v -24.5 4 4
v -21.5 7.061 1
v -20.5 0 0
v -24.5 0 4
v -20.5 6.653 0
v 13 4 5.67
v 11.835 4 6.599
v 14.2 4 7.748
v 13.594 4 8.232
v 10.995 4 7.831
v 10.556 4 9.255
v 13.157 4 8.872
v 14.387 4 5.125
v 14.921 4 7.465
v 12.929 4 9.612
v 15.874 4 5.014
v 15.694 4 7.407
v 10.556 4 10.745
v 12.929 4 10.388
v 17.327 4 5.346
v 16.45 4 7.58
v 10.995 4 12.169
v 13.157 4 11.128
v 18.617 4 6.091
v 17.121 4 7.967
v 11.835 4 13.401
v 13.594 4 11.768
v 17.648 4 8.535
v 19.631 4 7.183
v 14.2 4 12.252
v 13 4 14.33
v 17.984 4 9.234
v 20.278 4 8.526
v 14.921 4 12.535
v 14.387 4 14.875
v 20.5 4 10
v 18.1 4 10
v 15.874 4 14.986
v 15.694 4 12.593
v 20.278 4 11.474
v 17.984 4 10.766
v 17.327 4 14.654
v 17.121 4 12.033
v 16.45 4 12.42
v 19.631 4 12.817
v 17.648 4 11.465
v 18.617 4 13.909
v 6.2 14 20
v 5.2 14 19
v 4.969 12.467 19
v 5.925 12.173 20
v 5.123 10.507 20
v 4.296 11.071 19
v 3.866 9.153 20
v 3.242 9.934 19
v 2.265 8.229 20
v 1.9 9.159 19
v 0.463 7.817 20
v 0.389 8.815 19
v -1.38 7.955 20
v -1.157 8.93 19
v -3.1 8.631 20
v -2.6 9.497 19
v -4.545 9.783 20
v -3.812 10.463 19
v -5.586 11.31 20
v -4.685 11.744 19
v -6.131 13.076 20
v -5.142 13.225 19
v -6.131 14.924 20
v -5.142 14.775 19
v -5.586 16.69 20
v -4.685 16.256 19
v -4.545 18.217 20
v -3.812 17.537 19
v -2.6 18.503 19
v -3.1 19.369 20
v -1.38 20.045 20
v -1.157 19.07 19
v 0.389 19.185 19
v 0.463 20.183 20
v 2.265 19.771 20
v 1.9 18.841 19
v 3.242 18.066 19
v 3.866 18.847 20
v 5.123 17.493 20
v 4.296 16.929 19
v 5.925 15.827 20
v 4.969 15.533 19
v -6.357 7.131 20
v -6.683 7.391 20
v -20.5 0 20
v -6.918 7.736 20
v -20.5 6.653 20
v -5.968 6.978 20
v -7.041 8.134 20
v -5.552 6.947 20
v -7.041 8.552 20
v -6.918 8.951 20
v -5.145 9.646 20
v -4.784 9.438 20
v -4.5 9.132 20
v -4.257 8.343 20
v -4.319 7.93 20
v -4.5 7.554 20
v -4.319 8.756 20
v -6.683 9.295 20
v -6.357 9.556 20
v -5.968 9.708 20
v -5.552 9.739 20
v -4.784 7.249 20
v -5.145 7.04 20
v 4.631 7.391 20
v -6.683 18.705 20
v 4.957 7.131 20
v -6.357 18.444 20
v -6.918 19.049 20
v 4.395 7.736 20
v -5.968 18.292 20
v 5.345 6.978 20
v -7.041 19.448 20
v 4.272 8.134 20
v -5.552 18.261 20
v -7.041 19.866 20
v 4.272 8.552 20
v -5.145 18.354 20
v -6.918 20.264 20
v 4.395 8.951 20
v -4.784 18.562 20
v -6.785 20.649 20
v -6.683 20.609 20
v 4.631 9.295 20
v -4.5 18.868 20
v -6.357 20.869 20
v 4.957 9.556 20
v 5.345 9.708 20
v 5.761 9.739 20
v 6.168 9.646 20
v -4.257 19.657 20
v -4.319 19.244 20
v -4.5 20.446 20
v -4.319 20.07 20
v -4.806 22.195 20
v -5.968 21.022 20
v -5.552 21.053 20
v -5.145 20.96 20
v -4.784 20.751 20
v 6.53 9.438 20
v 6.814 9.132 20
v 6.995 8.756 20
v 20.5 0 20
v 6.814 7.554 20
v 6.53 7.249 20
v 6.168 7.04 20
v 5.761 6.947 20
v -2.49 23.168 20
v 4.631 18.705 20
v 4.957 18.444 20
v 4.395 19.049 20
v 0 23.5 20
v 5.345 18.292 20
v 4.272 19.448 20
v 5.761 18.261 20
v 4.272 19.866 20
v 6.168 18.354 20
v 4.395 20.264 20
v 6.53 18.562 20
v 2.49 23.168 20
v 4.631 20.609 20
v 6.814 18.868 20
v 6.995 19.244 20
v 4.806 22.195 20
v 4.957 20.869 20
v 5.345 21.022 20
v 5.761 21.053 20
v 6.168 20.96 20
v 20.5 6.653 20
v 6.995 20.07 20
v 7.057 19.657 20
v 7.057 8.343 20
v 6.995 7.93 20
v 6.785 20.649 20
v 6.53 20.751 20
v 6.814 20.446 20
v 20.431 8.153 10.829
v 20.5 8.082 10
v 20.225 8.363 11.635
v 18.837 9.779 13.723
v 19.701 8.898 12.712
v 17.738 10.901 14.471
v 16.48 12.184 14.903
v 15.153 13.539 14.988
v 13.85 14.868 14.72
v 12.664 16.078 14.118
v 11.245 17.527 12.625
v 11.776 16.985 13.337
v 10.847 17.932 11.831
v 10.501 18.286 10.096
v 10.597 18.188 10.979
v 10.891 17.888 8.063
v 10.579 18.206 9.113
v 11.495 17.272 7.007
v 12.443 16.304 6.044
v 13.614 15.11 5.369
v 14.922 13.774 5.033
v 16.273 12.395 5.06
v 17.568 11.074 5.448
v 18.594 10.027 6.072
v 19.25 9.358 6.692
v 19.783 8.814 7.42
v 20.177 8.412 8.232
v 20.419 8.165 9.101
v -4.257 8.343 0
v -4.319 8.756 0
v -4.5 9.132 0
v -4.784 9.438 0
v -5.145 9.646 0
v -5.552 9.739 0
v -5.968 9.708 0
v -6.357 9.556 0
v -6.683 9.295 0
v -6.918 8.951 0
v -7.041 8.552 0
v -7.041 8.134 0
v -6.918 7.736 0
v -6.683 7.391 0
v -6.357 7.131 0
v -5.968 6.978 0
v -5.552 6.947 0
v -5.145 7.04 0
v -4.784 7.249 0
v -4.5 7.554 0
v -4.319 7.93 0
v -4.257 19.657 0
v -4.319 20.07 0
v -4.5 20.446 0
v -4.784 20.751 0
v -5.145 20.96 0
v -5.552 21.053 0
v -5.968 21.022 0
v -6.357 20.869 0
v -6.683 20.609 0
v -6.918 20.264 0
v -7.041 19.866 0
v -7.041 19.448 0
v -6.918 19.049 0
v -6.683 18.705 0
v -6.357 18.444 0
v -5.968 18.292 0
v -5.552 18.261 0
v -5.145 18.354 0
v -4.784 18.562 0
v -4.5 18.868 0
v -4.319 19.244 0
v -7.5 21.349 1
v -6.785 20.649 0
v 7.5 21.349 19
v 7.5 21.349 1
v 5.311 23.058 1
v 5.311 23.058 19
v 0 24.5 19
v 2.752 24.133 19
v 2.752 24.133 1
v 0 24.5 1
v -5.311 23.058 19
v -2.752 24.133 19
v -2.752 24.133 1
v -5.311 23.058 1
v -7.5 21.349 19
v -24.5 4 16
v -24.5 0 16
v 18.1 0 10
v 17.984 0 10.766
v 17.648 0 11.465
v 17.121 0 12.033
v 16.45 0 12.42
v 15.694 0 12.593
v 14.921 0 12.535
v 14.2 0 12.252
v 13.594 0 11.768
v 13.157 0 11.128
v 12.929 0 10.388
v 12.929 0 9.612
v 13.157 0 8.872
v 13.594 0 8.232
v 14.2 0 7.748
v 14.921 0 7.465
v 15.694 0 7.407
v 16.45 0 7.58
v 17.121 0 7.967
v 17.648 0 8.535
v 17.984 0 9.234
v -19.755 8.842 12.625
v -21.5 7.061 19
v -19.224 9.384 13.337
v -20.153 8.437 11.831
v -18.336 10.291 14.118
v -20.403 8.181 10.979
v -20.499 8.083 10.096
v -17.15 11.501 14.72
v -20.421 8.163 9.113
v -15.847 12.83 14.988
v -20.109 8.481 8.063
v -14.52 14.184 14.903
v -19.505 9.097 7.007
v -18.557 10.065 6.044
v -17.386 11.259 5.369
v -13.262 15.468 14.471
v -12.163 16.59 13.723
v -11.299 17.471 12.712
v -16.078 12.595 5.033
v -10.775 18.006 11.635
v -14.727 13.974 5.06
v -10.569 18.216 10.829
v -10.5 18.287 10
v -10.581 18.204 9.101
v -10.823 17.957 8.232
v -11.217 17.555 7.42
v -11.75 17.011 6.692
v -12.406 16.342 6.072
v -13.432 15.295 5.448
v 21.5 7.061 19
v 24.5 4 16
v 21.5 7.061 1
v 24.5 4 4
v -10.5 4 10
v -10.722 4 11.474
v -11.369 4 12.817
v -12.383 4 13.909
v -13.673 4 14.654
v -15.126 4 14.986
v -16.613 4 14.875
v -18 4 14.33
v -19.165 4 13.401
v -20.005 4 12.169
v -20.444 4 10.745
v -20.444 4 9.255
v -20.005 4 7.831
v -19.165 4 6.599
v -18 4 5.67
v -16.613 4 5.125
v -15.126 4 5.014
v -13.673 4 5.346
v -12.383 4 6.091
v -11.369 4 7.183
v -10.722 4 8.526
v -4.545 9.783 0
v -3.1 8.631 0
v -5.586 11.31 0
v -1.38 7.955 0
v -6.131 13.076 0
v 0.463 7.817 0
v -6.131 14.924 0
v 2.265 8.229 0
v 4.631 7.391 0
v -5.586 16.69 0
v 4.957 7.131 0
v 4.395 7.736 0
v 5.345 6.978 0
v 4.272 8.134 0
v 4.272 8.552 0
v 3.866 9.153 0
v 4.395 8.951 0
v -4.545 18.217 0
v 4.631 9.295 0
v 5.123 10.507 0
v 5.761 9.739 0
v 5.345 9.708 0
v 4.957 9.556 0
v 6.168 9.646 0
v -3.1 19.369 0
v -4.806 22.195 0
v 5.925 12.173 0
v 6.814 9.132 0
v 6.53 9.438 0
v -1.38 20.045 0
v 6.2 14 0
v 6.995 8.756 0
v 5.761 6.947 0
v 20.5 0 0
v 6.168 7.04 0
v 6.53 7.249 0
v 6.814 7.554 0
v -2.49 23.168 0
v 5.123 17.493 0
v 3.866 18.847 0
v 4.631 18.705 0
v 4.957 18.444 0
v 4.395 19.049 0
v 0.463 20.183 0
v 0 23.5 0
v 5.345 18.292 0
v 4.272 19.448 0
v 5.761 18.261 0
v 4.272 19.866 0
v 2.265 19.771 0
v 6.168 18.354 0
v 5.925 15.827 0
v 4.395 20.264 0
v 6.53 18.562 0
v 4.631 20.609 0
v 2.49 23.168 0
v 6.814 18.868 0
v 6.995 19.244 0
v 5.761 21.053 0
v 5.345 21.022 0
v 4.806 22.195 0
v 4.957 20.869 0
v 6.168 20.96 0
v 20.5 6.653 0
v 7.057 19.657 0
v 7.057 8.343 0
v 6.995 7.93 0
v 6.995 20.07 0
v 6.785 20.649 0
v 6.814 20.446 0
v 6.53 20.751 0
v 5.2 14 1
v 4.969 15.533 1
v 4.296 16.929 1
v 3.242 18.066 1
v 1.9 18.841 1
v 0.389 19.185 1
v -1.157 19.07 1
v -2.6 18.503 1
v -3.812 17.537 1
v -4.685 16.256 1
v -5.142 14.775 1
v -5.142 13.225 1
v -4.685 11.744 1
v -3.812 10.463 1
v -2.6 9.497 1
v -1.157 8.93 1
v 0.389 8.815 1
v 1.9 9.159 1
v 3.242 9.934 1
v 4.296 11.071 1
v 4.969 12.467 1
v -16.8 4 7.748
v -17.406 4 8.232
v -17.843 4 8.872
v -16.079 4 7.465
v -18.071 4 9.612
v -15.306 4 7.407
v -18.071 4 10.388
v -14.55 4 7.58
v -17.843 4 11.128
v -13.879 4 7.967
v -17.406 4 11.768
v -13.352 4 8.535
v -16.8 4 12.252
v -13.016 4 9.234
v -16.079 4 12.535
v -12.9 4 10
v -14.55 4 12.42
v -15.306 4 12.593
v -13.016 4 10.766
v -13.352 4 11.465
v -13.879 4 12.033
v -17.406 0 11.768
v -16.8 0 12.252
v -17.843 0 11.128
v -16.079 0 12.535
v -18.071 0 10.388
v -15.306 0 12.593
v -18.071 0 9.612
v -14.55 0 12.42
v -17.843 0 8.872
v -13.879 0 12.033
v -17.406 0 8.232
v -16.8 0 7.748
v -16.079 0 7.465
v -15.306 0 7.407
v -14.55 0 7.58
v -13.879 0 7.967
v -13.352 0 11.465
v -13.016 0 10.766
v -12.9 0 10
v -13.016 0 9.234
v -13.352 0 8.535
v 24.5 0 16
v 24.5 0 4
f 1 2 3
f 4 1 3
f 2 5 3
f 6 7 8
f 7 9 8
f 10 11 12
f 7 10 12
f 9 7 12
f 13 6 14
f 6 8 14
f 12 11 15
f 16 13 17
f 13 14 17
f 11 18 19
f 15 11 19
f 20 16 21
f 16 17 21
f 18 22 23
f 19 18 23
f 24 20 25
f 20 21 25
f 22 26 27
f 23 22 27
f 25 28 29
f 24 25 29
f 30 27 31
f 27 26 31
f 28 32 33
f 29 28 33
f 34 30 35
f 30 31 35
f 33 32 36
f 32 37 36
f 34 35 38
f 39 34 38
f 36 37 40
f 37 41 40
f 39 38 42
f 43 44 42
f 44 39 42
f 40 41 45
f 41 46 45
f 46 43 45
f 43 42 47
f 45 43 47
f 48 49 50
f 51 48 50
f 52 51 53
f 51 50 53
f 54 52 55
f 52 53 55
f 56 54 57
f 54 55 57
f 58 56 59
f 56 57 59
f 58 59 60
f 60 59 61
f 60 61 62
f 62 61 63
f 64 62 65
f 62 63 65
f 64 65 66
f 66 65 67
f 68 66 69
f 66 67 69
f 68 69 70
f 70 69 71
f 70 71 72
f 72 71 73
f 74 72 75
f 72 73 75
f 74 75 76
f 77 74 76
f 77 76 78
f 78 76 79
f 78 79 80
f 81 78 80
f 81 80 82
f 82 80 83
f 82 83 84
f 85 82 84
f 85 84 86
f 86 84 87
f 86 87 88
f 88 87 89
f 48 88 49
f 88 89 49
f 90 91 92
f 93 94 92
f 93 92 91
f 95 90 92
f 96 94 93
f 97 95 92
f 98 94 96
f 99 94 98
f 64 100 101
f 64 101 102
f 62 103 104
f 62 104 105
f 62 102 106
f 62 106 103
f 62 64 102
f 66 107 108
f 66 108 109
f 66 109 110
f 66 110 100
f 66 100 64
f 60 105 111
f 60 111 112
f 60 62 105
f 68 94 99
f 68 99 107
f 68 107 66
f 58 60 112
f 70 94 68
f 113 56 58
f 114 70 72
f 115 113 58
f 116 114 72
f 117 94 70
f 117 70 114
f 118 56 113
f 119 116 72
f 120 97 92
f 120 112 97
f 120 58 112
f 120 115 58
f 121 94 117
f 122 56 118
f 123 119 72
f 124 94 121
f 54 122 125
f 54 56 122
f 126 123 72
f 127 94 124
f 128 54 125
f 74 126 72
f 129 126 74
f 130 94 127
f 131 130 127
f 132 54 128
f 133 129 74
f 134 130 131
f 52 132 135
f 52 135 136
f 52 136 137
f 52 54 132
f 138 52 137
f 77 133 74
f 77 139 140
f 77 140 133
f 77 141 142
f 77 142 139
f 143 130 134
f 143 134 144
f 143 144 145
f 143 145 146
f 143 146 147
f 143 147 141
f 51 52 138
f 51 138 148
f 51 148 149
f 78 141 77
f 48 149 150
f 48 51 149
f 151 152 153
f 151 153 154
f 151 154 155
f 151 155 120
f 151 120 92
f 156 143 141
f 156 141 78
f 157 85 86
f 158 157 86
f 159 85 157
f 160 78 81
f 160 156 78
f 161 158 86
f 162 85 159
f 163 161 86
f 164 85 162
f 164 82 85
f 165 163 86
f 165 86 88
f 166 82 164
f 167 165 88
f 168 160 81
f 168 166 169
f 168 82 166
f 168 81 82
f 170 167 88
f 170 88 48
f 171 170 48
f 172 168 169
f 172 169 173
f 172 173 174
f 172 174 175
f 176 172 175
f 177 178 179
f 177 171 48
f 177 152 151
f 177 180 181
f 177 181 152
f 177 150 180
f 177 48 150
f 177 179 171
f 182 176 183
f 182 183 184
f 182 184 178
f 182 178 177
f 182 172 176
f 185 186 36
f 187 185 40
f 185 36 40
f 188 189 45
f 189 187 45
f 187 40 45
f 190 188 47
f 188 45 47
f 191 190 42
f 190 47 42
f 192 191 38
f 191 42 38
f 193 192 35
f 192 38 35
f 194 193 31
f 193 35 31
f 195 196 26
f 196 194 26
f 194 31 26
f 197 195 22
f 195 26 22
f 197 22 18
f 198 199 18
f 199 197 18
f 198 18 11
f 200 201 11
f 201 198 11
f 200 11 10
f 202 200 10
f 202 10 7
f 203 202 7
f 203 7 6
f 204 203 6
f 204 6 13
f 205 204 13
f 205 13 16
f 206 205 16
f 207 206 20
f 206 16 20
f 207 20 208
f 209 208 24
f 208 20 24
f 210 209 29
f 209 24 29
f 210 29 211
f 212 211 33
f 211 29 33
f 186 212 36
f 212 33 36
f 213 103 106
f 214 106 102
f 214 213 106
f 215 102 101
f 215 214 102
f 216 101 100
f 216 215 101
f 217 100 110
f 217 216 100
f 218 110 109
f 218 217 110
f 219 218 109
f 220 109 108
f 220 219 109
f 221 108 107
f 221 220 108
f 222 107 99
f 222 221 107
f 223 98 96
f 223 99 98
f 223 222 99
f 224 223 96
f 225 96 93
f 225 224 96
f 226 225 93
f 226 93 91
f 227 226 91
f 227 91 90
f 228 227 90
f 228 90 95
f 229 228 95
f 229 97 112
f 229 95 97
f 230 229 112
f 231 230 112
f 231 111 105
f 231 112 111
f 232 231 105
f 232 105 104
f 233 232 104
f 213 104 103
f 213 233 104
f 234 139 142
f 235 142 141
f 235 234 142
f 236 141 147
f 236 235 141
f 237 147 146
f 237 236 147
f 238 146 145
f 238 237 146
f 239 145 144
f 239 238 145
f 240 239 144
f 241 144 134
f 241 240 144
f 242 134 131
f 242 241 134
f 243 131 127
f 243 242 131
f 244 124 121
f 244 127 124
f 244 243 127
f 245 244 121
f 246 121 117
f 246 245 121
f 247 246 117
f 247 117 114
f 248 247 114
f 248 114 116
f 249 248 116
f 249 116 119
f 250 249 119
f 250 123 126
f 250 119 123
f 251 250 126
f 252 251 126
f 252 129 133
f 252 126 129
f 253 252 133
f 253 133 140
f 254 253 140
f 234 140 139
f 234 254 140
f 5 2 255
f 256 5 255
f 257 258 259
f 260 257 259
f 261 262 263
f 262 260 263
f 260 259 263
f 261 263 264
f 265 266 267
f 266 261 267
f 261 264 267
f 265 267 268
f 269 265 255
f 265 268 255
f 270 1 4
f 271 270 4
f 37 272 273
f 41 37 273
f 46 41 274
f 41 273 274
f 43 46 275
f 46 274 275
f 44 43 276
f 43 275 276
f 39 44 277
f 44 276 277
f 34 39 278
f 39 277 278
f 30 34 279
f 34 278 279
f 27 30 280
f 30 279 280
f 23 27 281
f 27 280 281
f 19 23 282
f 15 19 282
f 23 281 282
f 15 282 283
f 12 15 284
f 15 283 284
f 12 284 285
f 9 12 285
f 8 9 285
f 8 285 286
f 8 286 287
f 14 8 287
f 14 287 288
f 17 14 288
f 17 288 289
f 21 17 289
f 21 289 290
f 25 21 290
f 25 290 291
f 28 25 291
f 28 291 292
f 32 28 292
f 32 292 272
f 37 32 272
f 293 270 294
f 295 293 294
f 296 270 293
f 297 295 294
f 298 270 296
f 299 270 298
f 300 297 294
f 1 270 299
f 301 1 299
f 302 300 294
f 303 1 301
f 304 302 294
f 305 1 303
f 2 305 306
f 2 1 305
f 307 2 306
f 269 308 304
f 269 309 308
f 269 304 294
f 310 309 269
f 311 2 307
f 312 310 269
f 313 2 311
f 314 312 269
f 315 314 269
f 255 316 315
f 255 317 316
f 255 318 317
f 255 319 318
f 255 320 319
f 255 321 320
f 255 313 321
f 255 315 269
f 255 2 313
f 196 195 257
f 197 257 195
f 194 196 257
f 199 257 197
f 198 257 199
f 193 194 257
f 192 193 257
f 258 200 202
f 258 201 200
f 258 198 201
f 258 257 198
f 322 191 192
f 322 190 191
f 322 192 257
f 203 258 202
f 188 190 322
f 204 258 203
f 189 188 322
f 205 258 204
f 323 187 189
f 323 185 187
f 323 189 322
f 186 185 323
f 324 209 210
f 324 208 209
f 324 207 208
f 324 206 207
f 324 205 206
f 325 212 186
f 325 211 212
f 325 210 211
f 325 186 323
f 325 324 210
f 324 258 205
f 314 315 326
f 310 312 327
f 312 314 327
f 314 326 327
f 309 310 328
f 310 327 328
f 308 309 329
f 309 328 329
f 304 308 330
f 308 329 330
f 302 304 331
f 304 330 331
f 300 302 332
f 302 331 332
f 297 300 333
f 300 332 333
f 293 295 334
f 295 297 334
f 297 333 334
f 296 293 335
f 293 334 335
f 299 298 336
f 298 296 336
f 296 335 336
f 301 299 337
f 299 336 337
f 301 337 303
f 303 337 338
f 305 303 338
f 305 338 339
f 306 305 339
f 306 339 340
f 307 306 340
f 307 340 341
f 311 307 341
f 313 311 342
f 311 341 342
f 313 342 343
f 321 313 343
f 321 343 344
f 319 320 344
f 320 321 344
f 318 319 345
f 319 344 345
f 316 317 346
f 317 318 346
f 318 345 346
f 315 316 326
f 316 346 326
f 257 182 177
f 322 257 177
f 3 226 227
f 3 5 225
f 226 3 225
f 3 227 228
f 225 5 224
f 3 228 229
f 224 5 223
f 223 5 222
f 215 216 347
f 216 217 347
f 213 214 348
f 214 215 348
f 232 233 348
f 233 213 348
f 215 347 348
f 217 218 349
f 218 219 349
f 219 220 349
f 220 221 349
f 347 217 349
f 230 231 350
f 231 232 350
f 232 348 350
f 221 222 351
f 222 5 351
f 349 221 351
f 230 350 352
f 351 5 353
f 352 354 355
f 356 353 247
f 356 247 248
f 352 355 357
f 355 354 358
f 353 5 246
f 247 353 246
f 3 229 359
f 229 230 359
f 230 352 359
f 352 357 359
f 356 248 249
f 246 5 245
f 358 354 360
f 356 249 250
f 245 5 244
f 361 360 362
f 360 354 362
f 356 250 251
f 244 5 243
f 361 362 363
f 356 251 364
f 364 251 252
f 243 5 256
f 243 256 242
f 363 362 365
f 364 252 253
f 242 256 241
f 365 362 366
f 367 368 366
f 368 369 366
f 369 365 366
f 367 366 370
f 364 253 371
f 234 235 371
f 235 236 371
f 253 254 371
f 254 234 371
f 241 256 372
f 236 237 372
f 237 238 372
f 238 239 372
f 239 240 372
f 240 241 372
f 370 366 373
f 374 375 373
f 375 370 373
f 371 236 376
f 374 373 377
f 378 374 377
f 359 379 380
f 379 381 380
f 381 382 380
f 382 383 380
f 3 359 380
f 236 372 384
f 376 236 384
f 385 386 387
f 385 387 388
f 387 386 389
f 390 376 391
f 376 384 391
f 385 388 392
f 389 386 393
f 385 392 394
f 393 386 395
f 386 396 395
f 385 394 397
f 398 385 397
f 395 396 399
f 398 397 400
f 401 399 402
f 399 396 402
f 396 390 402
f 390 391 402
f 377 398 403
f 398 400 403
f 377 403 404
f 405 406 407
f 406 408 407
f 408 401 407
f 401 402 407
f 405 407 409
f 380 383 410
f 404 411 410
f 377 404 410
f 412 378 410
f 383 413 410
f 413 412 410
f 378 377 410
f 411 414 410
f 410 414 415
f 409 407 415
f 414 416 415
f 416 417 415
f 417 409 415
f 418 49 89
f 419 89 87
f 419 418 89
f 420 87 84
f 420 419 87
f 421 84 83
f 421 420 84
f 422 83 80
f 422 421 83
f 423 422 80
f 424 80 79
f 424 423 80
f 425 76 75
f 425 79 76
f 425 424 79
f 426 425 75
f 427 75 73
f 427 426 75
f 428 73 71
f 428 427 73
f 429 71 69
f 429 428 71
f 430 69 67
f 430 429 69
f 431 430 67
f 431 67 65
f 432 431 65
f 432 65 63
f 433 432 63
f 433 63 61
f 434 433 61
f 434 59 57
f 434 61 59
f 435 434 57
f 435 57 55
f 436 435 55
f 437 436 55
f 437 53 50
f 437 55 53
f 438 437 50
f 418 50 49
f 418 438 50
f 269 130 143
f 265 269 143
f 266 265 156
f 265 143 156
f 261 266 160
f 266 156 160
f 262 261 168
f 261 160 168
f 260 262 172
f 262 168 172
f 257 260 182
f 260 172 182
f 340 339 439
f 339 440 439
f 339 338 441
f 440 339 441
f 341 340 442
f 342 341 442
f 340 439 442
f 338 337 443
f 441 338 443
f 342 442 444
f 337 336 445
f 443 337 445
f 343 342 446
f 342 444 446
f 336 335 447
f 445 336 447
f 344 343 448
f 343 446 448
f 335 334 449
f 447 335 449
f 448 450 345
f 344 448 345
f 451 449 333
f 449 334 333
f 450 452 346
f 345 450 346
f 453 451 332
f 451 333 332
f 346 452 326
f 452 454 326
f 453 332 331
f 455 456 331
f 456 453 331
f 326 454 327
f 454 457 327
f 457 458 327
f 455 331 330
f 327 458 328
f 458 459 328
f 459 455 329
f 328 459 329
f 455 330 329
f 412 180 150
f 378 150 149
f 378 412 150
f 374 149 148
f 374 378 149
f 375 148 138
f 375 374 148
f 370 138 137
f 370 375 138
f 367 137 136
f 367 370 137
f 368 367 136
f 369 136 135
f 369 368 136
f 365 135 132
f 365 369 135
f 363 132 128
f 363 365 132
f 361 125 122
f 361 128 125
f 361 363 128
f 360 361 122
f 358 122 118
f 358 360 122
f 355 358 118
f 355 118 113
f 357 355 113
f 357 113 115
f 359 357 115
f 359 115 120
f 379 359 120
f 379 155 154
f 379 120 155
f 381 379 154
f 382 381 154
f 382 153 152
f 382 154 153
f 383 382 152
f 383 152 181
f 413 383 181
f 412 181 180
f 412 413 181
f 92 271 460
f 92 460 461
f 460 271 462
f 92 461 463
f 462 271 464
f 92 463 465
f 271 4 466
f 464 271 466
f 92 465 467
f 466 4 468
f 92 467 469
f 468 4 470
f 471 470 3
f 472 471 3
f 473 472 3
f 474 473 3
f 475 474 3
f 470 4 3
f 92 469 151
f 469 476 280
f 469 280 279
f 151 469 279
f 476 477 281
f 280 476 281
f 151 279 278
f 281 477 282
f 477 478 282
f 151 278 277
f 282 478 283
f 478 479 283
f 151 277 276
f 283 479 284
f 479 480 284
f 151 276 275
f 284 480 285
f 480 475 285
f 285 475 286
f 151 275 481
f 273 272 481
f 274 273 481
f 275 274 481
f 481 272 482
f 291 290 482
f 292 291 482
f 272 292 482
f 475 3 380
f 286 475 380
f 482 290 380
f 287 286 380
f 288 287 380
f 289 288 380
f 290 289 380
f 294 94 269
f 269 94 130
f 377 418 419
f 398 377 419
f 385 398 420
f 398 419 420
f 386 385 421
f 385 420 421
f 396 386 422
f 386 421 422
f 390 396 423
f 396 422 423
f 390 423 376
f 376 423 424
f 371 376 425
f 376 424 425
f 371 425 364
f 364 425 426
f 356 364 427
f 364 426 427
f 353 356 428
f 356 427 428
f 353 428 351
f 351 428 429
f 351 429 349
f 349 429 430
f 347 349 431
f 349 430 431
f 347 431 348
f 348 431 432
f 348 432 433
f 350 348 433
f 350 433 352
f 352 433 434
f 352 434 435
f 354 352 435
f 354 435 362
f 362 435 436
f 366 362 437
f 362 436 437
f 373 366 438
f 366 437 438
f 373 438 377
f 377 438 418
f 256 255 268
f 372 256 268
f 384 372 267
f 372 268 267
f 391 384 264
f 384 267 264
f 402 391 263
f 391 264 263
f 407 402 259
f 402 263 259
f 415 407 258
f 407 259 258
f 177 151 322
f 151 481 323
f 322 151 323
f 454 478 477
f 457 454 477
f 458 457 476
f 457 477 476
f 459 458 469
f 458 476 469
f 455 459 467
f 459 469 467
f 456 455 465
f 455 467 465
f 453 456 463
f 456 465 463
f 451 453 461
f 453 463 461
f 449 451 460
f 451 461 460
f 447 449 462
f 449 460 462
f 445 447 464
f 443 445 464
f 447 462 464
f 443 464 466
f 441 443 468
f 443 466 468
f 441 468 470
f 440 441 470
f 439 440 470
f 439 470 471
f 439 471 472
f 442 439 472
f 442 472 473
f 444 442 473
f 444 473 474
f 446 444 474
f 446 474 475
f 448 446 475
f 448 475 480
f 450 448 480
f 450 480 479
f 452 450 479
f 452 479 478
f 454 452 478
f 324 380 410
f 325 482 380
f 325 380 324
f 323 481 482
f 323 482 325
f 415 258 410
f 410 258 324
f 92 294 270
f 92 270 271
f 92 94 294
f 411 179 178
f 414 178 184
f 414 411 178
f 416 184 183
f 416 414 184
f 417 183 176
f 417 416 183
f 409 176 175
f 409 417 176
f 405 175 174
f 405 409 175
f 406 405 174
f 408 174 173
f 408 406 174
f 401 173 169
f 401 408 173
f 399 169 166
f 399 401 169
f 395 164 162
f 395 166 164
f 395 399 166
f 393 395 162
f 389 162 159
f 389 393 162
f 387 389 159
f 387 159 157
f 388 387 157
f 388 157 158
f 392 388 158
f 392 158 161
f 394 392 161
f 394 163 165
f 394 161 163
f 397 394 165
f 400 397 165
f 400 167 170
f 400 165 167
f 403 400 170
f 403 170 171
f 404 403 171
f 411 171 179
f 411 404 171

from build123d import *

# Parameters (mm, degrees)
PAD_DEPTH       = 20
SKETCH001_R     = 2.6
POCKET_DEPTH    = 24.501
SKETCH002_R     = 5
POCKET001_DEPTH = 20.501
SKETCH003_R     = 5.2
SKETCH003_R_2   = 1.4
POCKET002_DEPTH = 20.001
CHAMFER_SIZE    = 4
CHAMFER001_SIZE = 1
CHAMFER002_SIZE = 1


with BuildPart() as part:
    # Sketch → Pad (new body)
    with BuildSketch(Plane.XY):
        with BuildLine():
            Line((-24.5, 4), (-24.5, 0))
            Line((-24.5, 0), (24.5, 0))
            Line((24.5, 0), (24.5, 4))
            Line((7.499559, 21.348919), (24.5, 4))
            ThreePointArc((7.499559, 21.348919), (0, 24.5), (-7.499559, 21.348919))
            Line((-24.5, 4), (-7.499559, 21.348919))
        make_face()
    extrude(amount=PAD_DEPTH)

    # Sketch001 → Pocket (cut, through all)
    with BuildSketch(Plane.XZ):
        with Locations((-15.5, 10)):
            Circle(SKETCH001_R)
        with Locations((15.5, 10)):
            Circle(SKETCH001_R)
    extrude(amount=-POCKET_DEPTH, mode=Mode.SUBTRACT)

    # Sketch002 (on DatumPlane) → Pocket001 (cut, through all)
    with BuildSketch(Plane.XZ.offset(-4)):
        with Locations((-15.5, 10)):
            Circle(SKETCH002_R)
        with Locations((15.5, 10)):
            Circle(SKETCH002_R)
    extrude(amount=-POCKET001_DEPTH, mode=Mode.SUBTRACT)

    # Sketch003 → Pocket002 (cut, through all)
    with BuildSketch(Plane.XY):
        with Locations((0, 14)):
            Circle(SKETCH003_R)
        with Locations((-5.656854, 19.656854)):
            Circle(SKETCH003_R_2)
        with Locations((5.656854, 19.656854)):
            Circle(SKETCH003_R_2)
        with Locations((5.656854, 8.343146)):
            Circle(SKETCH003_R_2)
        with Locations((-5.656854, 8.343146)):
            Circle(SKETCH003_R_2)
    extrude(amount=POCKET002_DEPTH, mode=Mode.SUBTRACT)

    # Chamfer
    chamfer_edges = [part.edges().sort_by_distance(p)[0] for p in [
        (24.5, 2, 20),
        (24.5, 2, 0),
        (-24.5, 2, 20),
        (-24.5, 2, 0),
    ]]
    chamfer(chamfer_edges, length=CHAMFER_SIZE)

    # Chamfer001
    chamfer001_edges = [part.edges().sort_by_distance(p)[0] for p in [
        (-5.2, 14, 20),
        (-5.2, 14, 0),
    ]]
    chamfer(chamfer001_edges, length=CHAMFER001_SIZE)

    # Chamfer002
    chamfer002_edges = [part.edges().sort_by_distance(p)[0] for p in [
        (13.999779, 14.715456, 20),
        (0, 24.5, 20),
        (-13.999779, 14.715456, 20),
        (-13.999779, 14.715456, 0),
        (0, 24.5, 0),
        (13.999779, 14.715456, 0),
    ]]
    chamfer(chamfer002_edges, length=CHAMFER002_SIZE)


solid = part.part
